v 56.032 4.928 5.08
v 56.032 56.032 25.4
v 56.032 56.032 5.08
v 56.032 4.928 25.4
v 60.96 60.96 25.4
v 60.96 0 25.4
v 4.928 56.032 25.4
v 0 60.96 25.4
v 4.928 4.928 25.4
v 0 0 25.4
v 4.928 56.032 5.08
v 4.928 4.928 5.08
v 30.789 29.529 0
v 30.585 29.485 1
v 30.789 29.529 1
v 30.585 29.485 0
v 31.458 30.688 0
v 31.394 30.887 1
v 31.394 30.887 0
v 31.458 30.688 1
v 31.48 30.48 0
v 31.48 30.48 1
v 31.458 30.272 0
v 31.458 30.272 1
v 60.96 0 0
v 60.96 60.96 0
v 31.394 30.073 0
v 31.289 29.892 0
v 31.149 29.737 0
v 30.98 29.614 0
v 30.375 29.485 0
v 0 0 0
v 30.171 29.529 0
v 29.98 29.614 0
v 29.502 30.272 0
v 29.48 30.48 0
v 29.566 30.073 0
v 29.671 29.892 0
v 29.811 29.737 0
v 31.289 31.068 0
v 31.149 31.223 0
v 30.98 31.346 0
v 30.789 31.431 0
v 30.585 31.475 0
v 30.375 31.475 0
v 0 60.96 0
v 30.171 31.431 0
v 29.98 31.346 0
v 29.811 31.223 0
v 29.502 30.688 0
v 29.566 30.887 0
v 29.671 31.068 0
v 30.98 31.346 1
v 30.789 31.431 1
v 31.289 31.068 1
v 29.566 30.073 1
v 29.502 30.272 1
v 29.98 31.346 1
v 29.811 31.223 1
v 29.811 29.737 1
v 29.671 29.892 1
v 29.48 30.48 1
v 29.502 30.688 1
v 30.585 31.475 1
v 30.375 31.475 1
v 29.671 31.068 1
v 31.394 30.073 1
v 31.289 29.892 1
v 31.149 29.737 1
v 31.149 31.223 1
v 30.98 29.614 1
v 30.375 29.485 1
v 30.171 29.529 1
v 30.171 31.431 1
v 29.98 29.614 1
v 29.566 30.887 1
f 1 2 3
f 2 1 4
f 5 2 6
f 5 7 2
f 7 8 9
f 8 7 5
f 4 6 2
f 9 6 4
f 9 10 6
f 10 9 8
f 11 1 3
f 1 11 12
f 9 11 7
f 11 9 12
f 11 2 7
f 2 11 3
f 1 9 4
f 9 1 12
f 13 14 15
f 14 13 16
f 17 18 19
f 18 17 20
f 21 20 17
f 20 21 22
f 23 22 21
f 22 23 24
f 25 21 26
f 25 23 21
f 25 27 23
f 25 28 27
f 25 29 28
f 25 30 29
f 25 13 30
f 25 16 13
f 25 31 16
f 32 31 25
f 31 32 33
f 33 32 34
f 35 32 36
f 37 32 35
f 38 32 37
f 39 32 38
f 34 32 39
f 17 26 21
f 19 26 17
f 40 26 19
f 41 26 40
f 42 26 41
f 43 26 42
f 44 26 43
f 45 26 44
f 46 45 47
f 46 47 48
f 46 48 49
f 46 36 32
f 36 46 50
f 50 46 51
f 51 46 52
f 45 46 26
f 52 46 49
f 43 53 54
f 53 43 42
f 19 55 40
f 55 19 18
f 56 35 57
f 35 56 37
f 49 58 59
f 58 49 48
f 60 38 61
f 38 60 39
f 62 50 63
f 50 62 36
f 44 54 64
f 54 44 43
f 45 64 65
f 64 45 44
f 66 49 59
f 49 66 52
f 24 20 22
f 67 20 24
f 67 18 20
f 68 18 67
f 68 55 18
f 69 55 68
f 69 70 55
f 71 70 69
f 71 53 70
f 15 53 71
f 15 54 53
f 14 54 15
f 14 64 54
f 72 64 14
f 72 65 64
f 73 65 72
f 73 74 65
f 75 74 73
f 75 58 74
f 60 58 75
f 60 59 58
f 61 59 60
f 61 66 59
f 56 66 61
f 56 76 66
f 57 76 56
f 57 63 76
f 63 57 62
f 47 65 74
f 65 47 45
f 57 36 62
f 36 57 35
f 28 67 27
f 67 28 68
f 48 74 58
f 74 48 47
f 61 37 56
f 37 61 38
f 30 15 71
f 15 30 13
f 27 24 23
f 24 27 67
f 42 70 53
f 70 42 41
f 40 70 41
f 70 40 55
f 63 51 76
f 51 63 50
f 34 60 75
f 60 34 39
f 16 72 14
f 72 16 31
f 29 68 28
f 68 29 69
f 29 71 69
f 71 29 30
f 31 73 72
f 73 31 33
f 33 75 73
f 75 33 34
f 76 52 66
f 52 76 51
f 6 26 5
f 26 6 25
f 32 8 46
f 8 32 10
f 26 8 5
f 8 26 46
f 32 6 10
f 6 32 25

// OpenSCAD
// file: defs.scad
// Special
function in2mm( mm ) = mm*25.4;
function mm( mm ) = mm;
module orange() { color("orange") children(); }
module red() { color("red") children(); }
module purple() { color("purple") children(); }
module blue() { color("blue") children(); }
module green() { color("green") children(); }
module black() { color("black") children(); }
$fs = 0.1;
forever = 1000;
//

// Configuration
SCALE = 1.65;  
model_threads = 0;  // inversely proportional to size
apply_pin_matrix = 1;
apply_mold = 1;
apply_fixture = 1;
inside_width = 130/SCALE;
matrix_x = 50.8;
//

// Walls

ptol = 1/SCALE;
_wall_thickness = 20/SCALE;

short_wall_x = inside_width + _wall_thickness*2;
short_wall_y = _wall_thickness;
short_wall_z = 40/SCALE;

tall_wall_x = _wall_thickness;
tall_wall_y = short_wall_x;
tall_wall_z = short_wall_z * 3;

short_wall_cut_y = short_wall_y;
short_wall_cut_x = tall_wall_x/2+ptol;
short_wall_cut_z = short_wall_z*4/5;
short_wall_cut_offset = tall_wall_x/2;

short_wall_ext_x = tall_wall_x + ptol/2;
short_wall_ext_y = short_wall_y;
short_wall_ext_z = short_wall_z;

tall_wall_ext_x = tall_wall_x;
tall_wall_ext_y = tall_wall_y/20;
tall_wall_ext_z = tall_wall_z;

tall_wall_cut_x = tall_wall_x/2;
tall_wall_cut_y = short_wall_y + ptol;

fixture_wall_x = matrix_x * .10;
fixture_wall_y = matrix_x * .10;
fixture_wall_z = matrix_x * .10;

fixture_x = matrix_x + fixture_wall_x*2;
fixture_y = matrix_x + fixture_wall_y*2;
fixture_z = matrix_x/2;

fixture_top_cut_x = fixture_x - fixture_wall_x*2 + ptol/2;
fixture_top_cut_y = fixture_y - fixture_wall_y*2 + ptol/2;
fixture_top_cut_z = fixture_z - fixture_wall_z;

fixture_bottom_hole_r = 5;



slab_shortener = 4/SCALE;
slab_wall = short_wall_z/2;

hole_rad = 2/SCALE;


//

// Slabs and holes

_slab_thickness = in2mm(1.0/4)*2;
_bearing_tightness_e = in2mm(1.0/4/20);

slab_x = tall_wall_y*14/20;
slab_y = _slab_thickness;
slab_z = short_wall_z/2;


linear_bearing_offset = slab_x/40;
linear_bearing_or = in2mm(1/4/2);
linear_bearing_ir = in2mm(1/8/2);



bearing_or = in2mm(1.0/4/2) - _bearing_tightness_e;
bearing_ir = in2mm(1.0/8/2);
bearing_y = in2mm(3.0/32);

threaded_rod_r_grip = in2mm(0.015);  // how much to shrink hole on threaded rod to get traction





//

// Assembly and appearance
slabx_o = in2mm(.3);
slaby_o = in2mm(.0);

pin_z = 150/SCALE;
pin_x = 2/SCALE;
pin_pad = 0.2;

mid_y = tall_wall_y/2;
mid_x = (short_wall_x + short_wall_ext_x*2)/2;

mx_pin_start = mid_x - matrix_x/2;
mx_pin_end = mid_x + matrix_x/2;

my_pin_start = mid_y - matrix_x/2;
my_pin_end = mid_y + matrix_x/2;

//
// main file
include <defs.scad>



module Fixture()
{
    difference()
    {
        _Fixture();
        fixture_cuts();
    }
}


module _Fixture()
{
    cube([fixture_x, fixture_y, fixture_z]);
}

module fixture_cuts()
{
    // cut
    translate([(fixture_x - fixture_top_cut_x)/2, (fixture_y - fixture_top_cut_y)/2, fixture_z-fixture_top_cut_z])
    {
        cube([fixture_top_cut_x, fixture_top_cut_y, fixture_top_cut_z]);
    }

    // hole
    translate([fixture_x/2,fixture_y/2, 0])
    {
        cylinder([fixture_wall_z, fixture_bottom_hole_r, fixture_bottom_hole_r]);
    }

}



Fixture();
